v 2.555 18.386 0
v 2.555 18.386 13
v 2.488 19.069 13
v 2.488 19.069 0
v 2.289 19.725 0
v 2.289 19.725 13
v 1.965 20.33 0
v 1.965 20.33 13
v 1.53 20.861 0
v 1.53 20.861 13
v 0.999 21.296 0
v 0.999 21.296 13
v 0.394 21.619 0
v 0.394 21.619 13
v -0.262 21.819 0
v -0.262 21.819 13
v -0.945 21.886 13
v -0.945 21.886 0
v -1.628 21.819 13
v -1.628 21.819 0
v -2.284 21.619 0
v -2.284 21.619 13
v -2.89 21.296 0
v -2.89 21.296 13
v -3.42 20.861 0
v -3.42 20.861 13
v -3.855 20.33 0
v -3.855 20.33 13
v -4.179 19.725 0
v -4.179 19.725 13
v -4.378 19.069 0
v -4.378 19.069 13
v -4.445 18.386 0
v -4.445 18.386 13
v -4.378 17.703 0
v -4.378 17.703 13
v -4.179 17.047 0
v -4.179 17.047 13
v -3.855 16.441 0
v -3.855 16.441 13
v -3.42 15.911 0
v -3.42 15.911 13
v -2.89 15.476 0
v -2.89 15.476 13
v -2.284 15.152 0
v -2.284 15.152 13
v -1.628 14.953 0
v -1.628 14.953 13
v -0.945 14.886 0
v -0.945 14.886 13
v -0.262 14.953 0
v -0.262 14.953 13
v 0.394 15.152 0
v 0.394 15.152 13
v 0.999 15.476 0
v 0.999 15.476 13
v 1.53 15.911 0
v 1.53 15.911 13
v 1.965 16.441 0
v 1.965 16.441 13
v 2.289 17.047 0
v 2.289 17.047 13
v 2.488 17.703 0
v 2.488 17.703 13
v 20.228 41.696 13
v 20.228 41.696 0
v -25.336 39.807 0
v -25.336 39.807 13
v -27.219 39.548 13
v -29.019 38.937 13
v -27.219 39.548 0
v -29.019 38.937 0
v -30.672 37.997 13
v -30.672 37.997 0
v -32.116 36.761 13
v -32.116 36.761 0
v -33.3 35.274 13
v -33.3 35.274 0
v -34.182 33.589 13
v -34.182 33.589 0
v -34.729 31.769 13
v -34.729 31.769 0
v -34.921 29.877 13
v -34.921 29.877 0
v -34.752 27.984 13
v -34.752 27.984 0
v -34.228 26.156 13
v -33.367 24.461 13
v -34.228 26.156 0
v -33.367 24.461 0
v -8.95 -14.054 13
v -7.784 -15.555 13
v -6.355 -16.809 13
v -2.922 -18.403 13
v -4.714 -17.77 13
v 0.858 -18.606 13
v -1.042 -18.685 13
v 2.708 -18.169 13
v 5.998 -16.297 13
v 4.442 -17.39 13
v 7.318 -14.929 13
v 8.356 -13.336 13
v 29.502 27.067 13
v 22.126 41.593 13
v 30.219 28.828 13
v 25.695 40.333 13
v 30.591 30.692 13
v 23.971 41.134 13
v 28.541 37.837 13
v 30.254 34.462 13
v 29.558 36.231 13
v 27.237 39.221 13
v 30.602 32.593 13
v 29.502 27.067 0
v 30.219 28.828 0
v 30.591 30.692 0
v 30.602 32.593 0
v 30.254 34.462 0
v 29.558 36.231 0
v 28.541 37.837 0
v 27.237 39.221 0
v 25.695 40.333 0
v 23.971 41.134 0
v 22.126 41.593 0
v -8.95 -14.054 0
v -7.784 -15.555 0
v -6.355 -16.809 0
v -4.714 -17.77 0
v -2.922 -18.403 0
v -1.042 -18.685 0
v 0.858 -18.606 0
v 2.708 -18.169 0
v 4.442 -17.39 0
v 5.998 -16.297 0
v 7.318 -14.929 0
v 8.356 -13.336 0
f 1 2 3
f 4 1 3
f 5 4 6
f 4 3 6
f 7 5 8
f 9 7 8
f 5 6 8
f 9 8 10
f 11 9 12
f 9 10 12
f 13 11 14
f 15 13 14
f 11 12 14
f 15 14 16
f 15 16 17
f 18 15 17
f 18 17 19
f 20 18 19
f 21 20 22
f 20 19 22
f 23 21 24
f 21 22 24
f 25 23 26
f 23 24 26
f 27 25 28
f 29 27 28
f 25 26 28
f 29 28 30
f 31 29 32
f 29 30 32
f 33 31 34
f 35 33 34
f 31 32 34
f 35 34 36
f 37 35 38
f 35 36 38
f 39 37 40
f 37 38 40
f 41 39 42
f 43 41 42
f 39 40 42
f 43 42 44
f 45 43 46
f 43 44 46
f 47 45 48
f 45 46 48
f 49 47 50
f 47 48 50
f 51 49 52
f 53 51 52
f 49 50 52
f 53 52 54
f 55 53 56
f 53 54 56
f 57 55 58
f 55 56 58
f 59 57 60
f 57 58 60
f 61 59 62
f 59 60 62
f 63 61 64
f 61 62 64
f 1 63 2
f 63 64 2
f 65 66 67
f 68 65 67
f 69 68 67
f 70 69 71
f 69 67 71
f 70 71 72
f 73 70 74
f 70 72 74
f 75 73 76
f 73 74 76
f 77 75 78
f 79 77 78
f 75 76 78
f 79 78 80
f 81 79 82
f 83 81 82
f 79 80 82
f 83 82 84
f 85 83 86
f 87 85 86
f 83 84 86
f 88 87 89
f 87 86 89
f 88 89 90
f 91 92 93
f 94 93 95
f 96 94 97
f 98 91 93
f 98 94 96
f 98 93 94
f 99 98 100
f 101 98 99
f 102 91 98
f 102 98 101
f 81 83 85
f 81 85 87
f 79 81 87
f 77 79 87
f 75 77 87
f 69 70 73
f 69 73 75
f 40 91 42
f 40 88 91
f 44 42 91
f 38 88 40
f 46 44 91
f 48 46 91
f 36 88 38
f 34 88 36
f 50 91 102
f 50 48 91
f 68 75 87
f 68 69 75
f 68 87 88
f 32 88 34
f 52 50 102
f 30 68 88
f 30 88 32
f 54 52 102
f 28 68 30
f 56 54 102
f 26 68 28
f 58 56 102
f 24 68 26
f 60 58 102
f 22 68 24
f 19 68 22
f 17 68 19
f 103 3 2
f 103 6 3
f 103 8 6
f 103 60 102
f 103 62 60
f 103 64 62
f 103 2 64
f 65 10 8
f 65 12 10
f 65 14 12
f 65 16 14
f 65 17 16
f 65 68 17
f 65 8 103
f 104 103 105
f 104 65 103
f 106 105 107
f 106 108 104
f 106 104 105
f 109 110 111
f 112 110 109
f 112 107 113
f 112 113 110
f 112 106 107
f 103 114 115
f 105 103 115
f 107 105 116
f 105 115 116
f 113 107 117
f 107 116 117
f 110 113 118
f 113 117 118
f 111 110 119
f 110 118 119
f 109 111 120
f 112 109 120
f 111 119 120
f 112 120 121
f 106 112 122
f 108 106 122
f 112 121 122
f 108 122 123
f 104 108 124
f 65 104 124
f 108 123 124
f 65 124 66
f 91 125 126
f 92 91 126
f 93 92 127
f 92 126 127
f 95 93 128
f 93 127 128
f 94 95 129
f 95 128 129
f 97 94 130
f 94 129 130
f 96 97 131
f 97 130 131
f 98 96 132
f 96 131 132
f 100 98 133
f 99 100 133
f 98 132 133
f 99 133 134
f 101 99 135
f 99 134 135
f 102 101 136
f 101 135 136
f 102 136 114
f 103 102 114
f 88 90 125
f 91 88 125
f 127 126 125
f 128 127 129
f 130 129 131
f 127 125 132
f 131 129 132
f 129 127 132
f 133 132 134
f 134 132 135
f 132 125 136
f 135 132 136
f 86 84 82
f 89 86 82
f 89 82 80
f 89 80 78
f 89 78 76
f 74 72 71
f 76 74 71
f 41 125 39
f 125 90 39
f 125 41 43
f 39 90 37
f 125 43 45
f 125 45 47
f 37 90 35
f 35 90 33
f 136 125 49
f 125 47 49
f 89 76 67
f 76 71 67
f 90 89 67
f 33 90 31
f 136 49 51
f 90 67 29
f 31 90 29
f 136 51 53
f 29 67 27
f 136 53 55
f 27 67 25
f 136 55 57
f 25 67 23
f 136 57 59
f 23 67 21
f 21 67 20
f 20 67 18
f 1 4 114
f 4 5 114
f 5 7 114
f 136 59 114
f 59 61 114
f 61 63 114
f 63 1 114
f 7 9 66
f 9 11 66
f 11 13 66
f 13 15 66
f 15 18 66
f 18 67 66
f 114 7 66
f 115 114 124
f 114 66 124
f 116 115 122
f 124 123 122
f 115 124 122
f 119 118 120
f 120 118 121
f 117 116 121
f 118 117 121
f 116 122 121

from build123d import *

# Parameters (mm, degrees)
EXTRUDE_2_DEPTH     = 13
SKETCH_5_R          = 3.5
CUT_EXTRUDE_3_DEPTH = 13


with BuildPart() as part:
    # 草图1 → 凸台-拉伸2 (new body)
    with BuildSketch(Plane.XY):
        with BuildLine():
            Line((8.355798715, -13.336367576), (29.501926433, 27.06708322))
            ThreePointArc((29.501926433, 27.06708322), (29.0877743, 37.05850344), (20.227874503, 41.695547281))
            Line((20.227874503, 41.695547281), (-25.335604147, 39.806905679))
            ThreePointArc((-25.335604147, 39.806905679), (-33.78135181, 34.452529301), (-33.367199677, 24.461109081))
            Line((-33.367199677, 24.461109081), (-8.949848746, -14.053700113))
            ThreePointArc((-8.949848746, -14.053700113), (-0.089948949, -18.690743955), (8.355798715, -13.336367576))
        make_face()
    extrude(amount=EXTRUDE_2_DEPTH)

    # 草图5 → 切除-拉伸3 (cut)
    with BuildSketch(Plane.XY.offset(13)):
        with Locations((-0.945044174, 18.385896346)):
            Circle(SKETCH_5_R)
    extrude(amount=-CUT_EXTRUDE_3_DEPTH, mode=Mode.SUBTRACT)


solid = part.part
